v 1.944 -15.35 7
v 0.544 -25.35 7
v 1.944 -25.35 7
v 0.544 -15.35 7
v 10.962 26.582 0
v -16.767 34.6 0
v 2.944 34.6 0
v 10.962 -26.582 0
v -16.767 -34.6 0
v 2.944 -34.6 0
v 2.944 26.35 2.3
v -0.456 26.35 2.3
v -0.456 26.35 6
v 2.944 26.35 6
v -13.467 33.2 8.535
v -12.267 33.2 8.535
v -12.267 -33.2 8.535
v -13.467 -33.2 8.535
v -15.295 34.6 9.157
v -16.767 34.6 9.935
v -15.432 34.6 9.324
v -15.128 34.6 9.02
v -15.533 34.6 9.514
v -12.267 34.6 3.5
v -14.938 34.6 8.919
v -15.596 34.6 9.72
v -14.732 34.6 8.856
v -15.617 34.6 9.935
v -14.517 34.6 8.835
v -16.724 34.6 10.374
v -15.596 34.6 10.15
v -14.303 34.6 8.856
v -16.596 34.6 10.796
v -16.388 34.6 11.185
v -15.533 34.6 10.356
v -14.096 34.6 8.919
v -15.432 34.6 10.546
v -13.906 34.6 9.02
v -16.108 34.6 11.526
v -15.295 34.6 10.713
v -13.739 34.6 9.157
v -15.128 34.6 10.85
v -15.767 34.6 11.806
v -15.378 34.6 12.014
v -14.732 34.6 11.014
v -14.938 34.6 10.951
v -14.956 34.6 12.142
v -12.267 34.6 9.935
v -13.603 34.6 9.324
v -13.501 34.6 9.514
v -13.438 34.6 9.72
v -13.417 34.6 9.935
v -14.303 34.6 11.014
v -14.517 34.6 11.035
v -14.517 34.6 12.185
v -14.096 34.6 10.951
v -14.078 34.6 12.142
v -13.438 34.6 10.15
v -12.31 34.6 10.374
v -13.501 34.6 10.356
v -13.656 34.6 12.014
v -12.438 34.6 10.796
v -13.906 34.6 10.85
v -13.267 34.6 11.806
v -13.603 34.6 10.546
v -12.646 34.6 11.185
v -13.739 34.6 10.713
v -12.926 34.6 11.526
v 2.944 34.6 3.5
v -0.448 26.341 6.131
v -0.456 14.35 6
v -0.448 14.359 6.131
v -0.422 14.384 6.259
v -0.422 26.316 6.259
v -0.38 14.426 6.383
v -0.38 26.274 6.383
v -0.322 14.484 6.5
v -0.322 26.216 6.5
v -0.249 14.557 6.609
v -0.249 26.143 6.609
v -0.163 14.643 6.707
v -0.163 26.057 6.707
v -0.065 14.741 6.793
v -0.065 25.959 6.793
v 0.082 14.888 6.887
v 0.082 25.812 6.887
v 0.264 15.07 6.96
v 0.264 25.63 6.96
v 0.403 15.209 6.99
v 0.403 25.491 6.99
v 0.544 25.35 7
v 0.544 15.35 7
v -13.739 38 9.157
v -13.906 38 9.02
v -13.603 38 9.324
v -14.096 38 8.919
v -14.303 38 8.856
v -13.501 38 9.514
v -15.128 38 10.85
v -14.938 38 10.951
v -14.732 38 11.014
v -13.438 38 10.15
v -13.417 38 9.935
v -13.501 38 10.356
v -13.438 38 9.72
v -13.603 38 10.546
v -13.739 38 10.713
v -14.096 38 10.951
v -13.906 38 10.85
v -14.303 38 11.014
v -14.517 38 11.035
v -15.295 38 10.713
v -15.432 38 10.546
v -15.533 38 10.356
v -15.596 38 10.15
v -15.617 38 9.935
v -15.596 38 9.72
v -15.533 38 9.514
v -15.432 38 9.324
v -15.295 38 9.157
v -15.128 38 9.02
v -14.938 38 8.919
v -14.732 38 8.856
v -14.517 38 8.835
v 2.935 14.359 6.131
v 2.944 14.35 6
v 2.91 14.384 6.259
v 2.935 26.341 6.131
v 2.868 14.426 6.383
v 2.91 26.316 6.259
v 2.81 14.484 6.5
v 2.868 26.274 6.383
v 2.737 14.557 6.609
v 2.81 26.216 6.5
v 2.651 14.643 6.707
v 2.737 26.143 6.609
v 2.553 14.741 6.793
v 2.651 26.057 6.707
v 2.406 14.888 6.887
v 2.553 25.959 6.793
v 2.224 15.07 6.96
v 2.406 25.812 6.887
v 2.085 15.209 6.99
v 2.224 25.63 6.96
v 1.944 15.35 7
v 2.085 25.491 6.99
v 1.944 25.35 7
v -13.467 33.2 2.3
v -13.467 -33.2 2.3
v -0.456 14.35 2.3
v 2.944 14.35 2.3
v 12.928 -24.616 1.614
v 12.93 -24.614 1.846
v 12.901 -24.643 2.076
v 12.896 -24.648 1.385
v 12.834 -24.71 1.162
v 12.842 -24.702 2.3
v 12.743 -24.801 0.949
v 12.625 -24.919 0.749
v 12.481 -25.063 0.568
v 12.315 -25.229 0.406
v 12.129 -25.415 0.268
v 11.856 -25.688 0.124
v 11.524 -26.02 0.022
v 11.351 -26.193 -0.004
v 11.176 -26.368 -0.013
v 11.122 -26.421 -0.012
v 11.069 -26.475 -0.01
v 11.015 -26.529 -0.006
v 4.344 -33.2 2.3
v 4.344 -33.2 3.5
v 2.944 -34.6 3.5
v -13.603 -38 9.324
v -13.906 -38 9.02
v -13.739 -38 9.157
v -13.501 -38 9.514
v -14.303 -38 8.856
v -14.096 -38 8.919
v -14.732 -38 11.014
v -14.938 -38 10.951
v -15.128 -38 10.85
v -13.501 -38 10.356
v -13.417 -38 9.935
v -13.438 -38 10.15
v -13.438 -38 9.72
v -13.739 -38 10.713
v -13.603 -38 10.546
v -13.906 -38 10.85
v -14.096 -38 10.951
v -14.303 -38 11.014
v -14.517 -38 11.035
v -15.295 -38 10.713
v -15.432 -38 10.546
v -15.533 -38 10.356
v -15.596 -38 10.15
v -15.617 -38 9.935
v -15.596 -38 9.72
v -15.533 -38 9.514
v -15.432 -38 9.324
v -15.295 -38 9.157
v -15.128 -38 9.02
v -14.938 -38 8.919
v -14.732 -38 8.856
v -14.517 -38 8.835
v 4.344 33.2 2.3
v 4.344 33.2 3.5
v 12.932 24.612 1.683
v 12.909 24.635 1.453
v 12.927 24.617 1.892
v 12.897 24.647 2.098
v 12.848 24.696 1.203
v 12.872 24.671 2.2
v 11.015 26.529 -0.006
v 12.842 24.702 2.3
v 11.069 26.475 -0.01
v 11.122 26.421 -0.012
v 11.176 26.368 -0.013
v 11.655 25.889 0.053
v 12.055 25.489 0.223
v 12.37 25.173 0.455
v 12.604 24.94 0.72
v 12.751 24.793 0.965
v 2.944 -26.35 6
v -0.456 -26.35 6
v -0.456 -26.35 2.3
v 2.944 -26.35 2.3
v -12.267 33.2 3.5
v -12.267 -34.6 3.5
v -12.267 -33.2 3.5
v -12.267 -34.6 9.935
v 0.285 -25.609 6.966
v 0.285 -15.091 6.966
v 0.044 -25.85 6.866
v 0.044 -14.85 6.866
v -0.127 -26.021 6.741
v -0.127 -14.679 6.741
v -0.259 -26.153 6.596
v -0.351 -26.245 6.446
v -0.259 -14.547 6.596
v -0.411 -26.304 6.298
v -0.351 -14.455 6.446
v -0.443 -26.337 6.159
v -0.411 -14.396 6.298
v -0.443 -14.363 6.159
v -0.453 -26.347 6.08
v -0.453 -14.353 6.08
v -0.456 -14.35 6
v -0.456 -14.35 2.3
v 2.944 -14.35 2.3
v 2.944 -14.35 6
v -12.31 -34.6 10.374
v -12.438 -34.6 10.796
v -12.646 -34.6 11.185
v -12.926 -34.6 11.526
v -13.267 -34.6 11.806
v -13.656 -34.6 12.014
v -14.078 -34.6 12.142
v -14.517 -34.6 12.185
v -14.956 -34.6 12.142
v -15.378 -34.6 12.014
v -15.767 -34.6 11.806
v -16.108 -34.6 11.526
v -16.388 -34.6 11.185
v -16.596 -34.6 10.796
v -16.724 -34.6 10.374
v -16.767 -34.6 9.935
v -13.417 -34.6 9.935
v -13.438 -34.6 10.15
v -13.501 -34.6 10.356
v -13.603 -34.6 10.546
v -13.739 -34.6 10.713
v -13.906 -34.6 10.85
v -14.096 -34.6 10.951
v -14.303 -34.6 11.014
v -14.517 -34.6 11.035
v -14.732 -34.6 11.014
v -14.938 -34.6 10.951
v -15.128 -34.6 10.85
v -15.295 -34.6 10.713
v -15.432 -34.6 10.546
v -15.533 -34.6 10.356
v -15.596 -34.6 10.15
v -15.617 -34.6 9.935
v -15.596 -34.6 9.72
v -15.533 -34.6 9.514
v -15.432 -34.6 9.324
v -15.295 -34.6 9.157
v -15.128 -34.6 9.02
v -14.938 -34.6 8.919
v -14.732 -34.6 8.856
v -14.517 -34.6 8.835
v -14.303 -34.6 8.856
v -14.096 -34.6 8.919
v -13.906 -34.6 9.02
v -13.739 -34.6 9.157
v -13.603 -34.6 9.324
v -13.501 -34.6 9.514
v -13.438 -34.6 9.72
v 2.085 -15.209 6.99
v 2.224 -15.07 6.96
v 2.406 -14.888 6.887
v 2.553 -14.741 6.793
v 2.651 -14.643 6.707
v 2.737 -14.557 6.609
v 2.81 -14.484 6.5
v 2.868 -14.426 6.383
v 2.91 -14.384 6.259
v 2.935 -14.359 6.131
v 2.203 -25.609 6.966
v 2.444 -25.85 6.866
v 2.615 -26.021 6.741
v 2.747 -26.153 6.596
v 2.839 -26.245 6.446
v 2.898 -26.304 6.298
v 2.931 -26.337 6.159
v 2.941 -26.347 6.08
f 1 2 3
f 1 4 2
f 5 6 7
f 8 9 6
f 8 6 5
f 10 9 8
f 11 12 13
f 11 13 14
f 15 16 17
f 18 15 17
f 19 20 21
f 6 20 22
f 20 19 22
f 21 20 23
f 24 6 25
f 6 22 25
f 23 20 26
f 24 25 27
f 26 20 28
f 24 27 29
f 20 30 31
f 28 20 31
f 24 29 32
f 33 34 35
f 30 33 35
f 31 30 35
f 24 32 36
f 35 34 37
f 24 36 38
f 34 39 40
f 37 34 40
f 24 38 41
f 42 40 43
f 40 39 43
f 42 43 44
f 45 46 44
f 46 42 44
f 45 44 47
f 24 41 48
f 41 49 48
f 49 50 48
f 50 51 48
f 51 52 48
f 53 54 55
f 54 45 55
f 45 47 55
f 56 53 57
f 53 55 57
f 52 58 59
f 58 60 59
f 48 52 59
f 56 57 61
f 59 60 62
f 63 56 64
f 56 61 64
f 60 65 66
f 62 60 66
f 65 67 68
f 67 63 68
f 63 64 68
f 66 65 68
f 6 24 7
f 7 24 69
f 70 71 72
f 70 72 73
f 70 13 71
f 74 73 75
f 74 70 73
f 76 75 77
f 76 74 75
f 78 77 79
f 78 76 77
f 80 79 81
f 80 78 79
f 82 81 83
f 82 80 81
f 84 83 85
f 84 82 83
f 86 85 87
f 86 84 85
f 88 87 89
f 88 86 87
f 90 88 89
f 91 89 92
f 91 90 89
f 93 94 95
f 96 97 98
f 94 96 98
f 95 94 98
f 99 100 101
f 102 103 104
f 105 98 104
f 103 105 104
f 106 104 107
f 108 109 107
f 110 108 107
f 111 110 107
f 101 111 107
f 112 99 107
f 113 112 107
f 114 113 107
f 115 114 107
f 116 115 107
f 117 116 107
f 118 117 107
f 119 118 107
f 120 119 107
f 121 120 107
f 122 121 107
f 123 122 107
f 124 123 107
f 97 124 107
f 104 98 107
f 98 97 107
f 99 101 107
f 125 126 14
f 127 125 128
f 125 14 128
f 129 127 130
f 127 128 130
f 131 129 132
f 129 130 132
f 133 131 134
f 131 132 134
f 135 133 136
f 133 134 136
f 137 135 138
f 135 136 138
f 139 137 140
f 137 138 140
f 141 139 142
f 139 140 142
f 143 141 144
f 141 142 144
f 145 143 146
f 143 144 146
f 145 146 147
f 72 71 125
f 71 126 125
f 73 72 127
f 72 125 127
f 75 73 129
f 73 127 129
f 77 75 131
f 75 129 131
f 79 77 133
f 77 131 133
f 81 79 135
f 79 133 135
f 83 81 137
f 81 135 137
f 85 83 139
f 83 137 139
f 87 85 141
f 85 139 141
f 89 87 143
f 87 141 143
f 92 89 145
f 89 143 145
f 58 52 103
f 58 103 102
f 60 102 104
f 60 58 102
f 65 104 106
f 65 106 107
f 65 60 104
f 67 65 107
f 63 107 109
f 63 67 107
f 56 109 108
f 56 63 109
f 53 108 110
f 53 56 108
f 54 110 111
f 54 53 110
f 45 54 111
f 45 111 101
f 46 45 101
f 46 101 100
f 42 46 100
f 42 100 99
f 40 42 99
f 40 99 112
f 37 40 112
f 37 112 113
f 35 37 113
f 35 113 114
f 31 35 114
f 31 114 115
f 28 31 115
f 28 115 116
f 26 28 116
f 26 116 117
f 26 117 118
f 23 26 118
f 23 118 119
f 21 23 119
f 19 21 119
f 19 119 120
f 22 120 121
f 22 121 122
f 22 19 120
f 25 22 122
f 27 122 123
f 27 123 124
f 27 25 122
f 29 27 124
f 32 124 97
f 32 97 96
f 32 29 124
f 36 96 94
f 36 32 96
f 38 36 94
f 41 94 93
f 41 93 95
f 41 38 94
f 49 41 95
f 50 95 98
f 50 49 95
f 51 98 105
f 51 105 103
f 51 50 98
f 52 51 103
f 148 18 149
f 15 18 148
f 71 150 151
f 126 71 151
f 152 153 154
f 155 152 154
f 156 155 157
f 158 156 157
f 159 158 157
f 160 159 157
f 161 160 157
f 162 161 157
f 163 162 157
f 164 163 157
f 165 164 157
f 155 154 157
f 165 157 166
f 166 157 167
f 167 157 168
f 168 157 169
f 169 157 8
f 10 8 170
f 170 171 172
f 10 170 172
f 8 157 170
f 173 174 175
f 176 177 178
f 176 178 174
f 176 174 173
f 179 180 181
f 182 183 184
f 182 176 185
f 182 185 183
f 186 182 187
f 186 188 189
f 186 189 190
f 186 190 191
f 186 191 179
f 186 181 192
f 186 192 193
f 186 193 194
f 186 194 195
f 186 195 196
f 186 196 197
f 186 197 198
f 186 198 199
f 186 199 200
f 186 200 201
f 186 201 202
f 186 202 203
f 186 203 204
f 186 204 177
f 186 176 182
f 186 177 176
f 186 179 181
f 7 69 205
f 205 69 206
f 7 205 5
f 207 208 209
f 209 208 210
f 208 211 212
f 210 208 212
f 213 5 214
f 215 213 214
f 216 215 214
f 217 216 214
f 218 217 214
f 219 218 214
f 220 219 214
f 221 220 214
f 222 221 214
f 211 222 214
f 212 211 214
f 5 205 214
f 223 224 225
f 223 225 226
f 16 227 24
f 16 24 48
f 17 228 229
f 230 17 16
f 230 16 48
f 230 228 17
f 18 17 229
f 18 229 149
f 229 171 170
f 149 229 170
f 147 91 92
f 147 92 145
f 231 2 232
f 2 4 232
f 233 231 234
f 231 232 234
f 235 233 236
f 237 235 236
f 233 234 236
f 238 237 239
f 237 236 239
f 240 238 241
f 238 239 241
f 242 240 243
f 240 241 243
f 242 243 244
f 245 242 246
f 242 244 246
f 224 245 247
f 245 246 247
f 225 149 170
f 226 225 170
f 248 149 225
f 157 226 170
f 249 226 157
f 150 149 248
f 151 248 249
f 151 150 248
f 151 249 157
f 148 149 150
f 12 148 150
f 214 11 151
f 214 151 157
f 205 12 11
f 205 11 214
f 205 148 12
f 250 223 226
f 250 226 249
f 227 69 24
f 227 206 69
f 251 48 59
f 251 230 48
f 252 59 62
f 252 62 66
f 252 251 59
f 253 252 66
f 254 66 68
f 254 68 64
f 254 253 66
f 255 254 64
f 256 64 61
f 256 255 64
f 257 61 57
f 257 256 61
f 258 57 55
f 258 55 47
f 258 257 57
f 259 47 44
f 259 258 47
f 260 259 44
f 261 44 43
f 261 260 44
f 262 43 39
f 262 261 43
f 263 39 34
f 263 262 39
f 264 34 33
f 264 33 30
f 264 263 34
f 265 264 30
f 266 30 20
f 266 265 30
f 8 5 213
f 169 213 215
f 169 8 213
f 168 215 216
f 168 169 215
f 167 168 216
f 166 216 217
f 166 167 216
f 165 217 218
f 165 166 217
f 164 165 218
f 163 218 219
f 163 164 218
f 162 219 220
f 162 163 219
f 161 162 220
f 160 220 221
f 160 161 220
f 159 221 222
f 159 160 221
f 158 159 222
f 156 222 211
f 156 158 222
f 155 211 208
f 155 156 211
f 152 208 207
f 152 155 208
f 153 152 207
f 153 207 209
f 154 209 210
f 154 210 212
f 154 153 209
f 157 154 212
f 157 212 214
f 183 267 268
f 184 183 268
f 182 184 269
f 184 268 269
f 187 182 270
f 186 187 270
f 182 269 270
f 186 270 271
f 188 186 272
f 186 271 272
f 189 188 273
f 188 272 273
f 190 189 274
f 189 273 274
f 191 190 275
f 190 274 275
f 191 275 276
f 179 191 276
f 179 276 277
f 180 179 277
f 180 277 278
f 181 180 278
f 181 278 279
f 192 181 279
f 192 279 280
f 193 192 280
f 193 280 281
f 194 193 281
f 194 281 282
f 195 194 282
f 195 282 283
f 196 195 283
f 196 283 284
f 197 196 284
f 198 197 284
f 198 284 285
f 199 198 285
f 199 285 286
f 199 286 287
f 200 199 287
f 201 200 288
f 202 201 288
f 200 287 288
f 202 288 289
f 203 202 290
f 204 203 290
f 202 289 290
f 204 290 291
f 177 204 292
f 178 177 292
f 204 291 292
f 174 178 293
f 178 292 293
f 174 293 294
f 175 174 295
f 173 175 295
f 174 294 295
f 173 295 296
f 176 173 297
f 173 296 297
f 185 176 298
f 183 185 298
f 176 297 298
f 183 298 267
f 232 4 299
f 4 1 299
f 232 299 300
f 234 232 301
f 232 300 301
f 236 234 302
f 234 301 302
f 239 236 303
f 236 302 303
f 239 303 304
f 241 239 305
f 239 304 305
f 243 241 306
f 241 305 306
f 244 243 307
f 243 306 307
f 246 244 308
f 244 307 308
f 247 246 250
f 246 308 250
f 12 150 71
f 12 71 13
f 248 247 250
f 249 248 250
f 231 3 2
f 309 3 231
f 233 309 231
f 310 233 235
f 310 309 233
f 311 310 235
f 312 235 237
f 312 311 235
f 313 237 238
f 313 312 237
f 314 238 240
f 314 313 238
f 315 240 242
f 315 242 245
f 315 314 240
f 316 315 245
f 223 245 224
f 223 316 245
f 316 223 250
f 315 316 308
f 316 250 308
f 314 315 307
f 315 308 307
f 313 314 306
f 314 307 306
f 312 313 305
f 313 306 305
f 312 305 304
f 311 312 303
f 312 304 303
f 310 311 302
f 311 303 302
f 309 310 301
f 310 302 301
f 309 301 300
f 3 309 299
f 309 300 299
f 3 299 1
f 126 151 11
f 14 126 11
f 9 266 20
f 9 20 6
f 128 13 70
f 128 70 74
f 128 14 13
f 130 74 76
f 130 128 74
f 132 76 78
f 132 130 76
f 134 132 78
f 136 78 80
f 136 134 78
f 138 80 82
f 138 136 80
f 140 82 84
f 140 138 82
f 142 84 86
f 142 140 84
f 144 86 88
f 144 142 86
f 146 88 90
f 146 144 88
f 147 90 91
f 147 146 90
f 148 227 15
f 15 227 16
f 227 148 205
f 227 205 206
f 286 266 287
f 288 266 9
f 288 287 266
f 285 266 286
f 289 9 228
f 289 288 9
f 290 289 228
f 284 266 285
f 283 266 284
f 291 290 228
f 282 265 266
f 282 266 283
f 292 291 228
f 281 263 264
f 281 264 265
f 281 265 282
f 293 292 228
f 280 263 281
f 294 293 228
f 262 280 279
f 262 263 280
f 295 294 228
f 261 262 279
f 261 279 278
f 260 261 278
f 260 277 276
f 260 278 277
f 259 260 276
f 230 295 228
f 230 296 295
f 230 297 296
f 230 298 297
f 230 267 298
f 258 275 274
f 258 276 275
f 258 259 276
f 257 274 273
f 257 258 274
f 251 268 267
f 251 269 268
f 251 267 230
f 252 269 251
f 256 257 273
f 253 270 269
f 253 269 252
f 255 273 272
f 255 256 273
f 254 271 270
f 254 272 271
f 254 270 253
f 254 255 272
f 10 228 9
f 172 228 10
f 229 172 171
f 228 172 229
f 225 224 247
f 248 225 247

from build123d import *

# Parameters (mm, degrees)
F0_R          = 1.1
F1_DEPTH      = 34.6
F1_DEPTH_BACK = 34.6
F2_DEPTH      = 38
F2_DEPTH_BACK = 38
F4_DEPTH      = 1.2
F5_W          = 3.4
F5_H          = 12
F5_W_2        = 1.2
F5_H_2        = 66.4
F6_DEPTH      = 1.2
F7_DEPTH      = 5
F7_DEPTH_BACK = 5
F8_DEPTH      = 3.5
F9_R          = 1


# Not quite as in the source:
# - a pattern or mirror of a feature is missing from the dataset's text; its kind, count and spacing are read off the source's solid
# - a feature names something its author has since deleted; it is built from what else it names


with BuildPart() as f1:
    # F0 (on Front) → F1 (new body, two sides)
    with BuildSketch(Plane.XZ) as f1_sk:
        with BuildLine():
            ThreePointArc((-12.2672023306, 9.9350791425), (-14.5172023306, 12.1850791425), (-16.7672023306, 9.9350791425))
            Line((-16.7672023306, 9.9350791425), (-16.7672023306, 0))
            Line((-16.7672023306, 0), (10.9618057992, 0))
            ThreePointArc((10.9618057992, 0), (12.9295104862, 1.6360189486), (11.1762294546, 3.5))
            Line((11.1762294546, 3.5), (-12.2672023306, 3.5))
            Line((-12.2672023306, 3.5), (-12.2672023306, 9.9350791425))
        make_face()
        with Locations((-14.5172023306, 9.9350791425)):
            Circle(F0_R, mode=Mode.SUBTRACT)
    extrude(amount=F1_DEPTH)
    extrude(f1_sk.sketch, amount=-F1_DEPTH_BACK)

    # F0 (on Front) → F2 (join, two sides)
    with BuildSketch(Plane.XZ) as f2_sk:
        with Locations((-14.5172023306, 9.9350791425)):
            Circle(F0_R)
    extrude(amount=F2_DEPTH)
    extrude(f2_sk.sketch, amount=-F2_DEPTH_BACK)

    # F3 (on face) → F4 (cut)
    with BuildSketch(Plane.YZ.offset(-12.2672023306)):
        Polygon((-33.2, 4.5), (-33.2, 3.5), (33.2, 3.5), (33.2, 8.5350791425), (-33.2, 8.5350791425), align=None)
    extrude(amount=-F4_DEPTH, mode=Mode.SUBTRACT)

    # F5 (on face) → F6 (cut)
    with BuildSketch(Plane.XY.offset(3.5)):
        Polygon((11.1762294546, 34.6), (2.9438750446, 34.6), (4.3438750446, 33.2), (11.1762294546, 26.36764559), align=None)
        Polygon((4.3438750446, 33.2), (-12.2672023306, 33.2), (-12.2672023306, -33.2), (4.3438750446, -33.2), (11.1762294546, -26.36764559), (11.1762294546, 26.36764559), align=None)
        with Locations((1.2438750446, -20.35)):
            Rectangle(F5_W, F5_H, mode=Mode.SUBTRACT)
        with Locations((1.2438750446, 20.35)):
            Rectangle(F5_W, F5_H, mode=Mode.SUBTRACT)
        with Locations((-12.8672023306, 0)):
            Rectangle(F5_W_2, F5_H_2)
        Polygon((12.9438750446, 24.6), (11.1762294546, 26.36764559), (11.1762294546, -26.36764559), (12.9438750446, -24.6), align=None)
    extrude(amount=-F6_DEPTH, mode=Mode.SUBTRACT)

    # F5 (on face) → F7 (cut, two sides)
    with BuildSketch(Plane.XY.offset(3.5)) as f7_sk:
        Polygon((12.9438750446, 34.6), (11.1762294546, 34.6), (11.1762294546, 26.36764559), (12.9438750446, 24.6), align=None)
        Polygon((12.9438750446, -24.6), (11.1762294546, -26.36764559), (11.1762294546, -34.6), (12.9438750446, -34.6), align=None)
        Polygon((11.1762294546, -26.36764559), (4.3438750446, -33.2), (2.9438750446, -34.6), (11.1762294546, -34.6), align=None)
    f7 = extrude(amount=-F7_DEPTH, mode=Mode.SUBTRACT) + extrude(f7_sk.sketch, amount=F7_DEPTH_BACK, mode=Mode.SUBTRACT)

    # F7_copies: F7 across plane
    add(f7.mirror(Plane.ZX), mode=Mode.SUBTRACT)

    # F5 (on face) → F8 (join)
    with BuildSketch(Plane.XY.offset(3.5)):
        with Locations((1.2438750446, 20.35)):
            Rectangle(F5_W, F5_H)
        with Locations((1.2438750446, -20.35)):
            Rectangle(F5_W, F5_H)
    extrude(amount=F8_DEPTH)

    # F9
    f9_edges = [f1.edges().sort_by_distance(p)[0] for p in [
        (1.243875, -26.35, 7),
        (2.943875, -20.35, 7),
        (1.243875, -14.35, 7),
        (-0.456125, -20.35, 7),
        (-0.456125, 20.35, 7),
        (1.243875, 14.35, 7),
        (2.943875, 20.35, 7),
        (1.243875, 26.35, 7),
    ]]
    fillet(f9_edges, radius=F9_R)


solid = f1.part
